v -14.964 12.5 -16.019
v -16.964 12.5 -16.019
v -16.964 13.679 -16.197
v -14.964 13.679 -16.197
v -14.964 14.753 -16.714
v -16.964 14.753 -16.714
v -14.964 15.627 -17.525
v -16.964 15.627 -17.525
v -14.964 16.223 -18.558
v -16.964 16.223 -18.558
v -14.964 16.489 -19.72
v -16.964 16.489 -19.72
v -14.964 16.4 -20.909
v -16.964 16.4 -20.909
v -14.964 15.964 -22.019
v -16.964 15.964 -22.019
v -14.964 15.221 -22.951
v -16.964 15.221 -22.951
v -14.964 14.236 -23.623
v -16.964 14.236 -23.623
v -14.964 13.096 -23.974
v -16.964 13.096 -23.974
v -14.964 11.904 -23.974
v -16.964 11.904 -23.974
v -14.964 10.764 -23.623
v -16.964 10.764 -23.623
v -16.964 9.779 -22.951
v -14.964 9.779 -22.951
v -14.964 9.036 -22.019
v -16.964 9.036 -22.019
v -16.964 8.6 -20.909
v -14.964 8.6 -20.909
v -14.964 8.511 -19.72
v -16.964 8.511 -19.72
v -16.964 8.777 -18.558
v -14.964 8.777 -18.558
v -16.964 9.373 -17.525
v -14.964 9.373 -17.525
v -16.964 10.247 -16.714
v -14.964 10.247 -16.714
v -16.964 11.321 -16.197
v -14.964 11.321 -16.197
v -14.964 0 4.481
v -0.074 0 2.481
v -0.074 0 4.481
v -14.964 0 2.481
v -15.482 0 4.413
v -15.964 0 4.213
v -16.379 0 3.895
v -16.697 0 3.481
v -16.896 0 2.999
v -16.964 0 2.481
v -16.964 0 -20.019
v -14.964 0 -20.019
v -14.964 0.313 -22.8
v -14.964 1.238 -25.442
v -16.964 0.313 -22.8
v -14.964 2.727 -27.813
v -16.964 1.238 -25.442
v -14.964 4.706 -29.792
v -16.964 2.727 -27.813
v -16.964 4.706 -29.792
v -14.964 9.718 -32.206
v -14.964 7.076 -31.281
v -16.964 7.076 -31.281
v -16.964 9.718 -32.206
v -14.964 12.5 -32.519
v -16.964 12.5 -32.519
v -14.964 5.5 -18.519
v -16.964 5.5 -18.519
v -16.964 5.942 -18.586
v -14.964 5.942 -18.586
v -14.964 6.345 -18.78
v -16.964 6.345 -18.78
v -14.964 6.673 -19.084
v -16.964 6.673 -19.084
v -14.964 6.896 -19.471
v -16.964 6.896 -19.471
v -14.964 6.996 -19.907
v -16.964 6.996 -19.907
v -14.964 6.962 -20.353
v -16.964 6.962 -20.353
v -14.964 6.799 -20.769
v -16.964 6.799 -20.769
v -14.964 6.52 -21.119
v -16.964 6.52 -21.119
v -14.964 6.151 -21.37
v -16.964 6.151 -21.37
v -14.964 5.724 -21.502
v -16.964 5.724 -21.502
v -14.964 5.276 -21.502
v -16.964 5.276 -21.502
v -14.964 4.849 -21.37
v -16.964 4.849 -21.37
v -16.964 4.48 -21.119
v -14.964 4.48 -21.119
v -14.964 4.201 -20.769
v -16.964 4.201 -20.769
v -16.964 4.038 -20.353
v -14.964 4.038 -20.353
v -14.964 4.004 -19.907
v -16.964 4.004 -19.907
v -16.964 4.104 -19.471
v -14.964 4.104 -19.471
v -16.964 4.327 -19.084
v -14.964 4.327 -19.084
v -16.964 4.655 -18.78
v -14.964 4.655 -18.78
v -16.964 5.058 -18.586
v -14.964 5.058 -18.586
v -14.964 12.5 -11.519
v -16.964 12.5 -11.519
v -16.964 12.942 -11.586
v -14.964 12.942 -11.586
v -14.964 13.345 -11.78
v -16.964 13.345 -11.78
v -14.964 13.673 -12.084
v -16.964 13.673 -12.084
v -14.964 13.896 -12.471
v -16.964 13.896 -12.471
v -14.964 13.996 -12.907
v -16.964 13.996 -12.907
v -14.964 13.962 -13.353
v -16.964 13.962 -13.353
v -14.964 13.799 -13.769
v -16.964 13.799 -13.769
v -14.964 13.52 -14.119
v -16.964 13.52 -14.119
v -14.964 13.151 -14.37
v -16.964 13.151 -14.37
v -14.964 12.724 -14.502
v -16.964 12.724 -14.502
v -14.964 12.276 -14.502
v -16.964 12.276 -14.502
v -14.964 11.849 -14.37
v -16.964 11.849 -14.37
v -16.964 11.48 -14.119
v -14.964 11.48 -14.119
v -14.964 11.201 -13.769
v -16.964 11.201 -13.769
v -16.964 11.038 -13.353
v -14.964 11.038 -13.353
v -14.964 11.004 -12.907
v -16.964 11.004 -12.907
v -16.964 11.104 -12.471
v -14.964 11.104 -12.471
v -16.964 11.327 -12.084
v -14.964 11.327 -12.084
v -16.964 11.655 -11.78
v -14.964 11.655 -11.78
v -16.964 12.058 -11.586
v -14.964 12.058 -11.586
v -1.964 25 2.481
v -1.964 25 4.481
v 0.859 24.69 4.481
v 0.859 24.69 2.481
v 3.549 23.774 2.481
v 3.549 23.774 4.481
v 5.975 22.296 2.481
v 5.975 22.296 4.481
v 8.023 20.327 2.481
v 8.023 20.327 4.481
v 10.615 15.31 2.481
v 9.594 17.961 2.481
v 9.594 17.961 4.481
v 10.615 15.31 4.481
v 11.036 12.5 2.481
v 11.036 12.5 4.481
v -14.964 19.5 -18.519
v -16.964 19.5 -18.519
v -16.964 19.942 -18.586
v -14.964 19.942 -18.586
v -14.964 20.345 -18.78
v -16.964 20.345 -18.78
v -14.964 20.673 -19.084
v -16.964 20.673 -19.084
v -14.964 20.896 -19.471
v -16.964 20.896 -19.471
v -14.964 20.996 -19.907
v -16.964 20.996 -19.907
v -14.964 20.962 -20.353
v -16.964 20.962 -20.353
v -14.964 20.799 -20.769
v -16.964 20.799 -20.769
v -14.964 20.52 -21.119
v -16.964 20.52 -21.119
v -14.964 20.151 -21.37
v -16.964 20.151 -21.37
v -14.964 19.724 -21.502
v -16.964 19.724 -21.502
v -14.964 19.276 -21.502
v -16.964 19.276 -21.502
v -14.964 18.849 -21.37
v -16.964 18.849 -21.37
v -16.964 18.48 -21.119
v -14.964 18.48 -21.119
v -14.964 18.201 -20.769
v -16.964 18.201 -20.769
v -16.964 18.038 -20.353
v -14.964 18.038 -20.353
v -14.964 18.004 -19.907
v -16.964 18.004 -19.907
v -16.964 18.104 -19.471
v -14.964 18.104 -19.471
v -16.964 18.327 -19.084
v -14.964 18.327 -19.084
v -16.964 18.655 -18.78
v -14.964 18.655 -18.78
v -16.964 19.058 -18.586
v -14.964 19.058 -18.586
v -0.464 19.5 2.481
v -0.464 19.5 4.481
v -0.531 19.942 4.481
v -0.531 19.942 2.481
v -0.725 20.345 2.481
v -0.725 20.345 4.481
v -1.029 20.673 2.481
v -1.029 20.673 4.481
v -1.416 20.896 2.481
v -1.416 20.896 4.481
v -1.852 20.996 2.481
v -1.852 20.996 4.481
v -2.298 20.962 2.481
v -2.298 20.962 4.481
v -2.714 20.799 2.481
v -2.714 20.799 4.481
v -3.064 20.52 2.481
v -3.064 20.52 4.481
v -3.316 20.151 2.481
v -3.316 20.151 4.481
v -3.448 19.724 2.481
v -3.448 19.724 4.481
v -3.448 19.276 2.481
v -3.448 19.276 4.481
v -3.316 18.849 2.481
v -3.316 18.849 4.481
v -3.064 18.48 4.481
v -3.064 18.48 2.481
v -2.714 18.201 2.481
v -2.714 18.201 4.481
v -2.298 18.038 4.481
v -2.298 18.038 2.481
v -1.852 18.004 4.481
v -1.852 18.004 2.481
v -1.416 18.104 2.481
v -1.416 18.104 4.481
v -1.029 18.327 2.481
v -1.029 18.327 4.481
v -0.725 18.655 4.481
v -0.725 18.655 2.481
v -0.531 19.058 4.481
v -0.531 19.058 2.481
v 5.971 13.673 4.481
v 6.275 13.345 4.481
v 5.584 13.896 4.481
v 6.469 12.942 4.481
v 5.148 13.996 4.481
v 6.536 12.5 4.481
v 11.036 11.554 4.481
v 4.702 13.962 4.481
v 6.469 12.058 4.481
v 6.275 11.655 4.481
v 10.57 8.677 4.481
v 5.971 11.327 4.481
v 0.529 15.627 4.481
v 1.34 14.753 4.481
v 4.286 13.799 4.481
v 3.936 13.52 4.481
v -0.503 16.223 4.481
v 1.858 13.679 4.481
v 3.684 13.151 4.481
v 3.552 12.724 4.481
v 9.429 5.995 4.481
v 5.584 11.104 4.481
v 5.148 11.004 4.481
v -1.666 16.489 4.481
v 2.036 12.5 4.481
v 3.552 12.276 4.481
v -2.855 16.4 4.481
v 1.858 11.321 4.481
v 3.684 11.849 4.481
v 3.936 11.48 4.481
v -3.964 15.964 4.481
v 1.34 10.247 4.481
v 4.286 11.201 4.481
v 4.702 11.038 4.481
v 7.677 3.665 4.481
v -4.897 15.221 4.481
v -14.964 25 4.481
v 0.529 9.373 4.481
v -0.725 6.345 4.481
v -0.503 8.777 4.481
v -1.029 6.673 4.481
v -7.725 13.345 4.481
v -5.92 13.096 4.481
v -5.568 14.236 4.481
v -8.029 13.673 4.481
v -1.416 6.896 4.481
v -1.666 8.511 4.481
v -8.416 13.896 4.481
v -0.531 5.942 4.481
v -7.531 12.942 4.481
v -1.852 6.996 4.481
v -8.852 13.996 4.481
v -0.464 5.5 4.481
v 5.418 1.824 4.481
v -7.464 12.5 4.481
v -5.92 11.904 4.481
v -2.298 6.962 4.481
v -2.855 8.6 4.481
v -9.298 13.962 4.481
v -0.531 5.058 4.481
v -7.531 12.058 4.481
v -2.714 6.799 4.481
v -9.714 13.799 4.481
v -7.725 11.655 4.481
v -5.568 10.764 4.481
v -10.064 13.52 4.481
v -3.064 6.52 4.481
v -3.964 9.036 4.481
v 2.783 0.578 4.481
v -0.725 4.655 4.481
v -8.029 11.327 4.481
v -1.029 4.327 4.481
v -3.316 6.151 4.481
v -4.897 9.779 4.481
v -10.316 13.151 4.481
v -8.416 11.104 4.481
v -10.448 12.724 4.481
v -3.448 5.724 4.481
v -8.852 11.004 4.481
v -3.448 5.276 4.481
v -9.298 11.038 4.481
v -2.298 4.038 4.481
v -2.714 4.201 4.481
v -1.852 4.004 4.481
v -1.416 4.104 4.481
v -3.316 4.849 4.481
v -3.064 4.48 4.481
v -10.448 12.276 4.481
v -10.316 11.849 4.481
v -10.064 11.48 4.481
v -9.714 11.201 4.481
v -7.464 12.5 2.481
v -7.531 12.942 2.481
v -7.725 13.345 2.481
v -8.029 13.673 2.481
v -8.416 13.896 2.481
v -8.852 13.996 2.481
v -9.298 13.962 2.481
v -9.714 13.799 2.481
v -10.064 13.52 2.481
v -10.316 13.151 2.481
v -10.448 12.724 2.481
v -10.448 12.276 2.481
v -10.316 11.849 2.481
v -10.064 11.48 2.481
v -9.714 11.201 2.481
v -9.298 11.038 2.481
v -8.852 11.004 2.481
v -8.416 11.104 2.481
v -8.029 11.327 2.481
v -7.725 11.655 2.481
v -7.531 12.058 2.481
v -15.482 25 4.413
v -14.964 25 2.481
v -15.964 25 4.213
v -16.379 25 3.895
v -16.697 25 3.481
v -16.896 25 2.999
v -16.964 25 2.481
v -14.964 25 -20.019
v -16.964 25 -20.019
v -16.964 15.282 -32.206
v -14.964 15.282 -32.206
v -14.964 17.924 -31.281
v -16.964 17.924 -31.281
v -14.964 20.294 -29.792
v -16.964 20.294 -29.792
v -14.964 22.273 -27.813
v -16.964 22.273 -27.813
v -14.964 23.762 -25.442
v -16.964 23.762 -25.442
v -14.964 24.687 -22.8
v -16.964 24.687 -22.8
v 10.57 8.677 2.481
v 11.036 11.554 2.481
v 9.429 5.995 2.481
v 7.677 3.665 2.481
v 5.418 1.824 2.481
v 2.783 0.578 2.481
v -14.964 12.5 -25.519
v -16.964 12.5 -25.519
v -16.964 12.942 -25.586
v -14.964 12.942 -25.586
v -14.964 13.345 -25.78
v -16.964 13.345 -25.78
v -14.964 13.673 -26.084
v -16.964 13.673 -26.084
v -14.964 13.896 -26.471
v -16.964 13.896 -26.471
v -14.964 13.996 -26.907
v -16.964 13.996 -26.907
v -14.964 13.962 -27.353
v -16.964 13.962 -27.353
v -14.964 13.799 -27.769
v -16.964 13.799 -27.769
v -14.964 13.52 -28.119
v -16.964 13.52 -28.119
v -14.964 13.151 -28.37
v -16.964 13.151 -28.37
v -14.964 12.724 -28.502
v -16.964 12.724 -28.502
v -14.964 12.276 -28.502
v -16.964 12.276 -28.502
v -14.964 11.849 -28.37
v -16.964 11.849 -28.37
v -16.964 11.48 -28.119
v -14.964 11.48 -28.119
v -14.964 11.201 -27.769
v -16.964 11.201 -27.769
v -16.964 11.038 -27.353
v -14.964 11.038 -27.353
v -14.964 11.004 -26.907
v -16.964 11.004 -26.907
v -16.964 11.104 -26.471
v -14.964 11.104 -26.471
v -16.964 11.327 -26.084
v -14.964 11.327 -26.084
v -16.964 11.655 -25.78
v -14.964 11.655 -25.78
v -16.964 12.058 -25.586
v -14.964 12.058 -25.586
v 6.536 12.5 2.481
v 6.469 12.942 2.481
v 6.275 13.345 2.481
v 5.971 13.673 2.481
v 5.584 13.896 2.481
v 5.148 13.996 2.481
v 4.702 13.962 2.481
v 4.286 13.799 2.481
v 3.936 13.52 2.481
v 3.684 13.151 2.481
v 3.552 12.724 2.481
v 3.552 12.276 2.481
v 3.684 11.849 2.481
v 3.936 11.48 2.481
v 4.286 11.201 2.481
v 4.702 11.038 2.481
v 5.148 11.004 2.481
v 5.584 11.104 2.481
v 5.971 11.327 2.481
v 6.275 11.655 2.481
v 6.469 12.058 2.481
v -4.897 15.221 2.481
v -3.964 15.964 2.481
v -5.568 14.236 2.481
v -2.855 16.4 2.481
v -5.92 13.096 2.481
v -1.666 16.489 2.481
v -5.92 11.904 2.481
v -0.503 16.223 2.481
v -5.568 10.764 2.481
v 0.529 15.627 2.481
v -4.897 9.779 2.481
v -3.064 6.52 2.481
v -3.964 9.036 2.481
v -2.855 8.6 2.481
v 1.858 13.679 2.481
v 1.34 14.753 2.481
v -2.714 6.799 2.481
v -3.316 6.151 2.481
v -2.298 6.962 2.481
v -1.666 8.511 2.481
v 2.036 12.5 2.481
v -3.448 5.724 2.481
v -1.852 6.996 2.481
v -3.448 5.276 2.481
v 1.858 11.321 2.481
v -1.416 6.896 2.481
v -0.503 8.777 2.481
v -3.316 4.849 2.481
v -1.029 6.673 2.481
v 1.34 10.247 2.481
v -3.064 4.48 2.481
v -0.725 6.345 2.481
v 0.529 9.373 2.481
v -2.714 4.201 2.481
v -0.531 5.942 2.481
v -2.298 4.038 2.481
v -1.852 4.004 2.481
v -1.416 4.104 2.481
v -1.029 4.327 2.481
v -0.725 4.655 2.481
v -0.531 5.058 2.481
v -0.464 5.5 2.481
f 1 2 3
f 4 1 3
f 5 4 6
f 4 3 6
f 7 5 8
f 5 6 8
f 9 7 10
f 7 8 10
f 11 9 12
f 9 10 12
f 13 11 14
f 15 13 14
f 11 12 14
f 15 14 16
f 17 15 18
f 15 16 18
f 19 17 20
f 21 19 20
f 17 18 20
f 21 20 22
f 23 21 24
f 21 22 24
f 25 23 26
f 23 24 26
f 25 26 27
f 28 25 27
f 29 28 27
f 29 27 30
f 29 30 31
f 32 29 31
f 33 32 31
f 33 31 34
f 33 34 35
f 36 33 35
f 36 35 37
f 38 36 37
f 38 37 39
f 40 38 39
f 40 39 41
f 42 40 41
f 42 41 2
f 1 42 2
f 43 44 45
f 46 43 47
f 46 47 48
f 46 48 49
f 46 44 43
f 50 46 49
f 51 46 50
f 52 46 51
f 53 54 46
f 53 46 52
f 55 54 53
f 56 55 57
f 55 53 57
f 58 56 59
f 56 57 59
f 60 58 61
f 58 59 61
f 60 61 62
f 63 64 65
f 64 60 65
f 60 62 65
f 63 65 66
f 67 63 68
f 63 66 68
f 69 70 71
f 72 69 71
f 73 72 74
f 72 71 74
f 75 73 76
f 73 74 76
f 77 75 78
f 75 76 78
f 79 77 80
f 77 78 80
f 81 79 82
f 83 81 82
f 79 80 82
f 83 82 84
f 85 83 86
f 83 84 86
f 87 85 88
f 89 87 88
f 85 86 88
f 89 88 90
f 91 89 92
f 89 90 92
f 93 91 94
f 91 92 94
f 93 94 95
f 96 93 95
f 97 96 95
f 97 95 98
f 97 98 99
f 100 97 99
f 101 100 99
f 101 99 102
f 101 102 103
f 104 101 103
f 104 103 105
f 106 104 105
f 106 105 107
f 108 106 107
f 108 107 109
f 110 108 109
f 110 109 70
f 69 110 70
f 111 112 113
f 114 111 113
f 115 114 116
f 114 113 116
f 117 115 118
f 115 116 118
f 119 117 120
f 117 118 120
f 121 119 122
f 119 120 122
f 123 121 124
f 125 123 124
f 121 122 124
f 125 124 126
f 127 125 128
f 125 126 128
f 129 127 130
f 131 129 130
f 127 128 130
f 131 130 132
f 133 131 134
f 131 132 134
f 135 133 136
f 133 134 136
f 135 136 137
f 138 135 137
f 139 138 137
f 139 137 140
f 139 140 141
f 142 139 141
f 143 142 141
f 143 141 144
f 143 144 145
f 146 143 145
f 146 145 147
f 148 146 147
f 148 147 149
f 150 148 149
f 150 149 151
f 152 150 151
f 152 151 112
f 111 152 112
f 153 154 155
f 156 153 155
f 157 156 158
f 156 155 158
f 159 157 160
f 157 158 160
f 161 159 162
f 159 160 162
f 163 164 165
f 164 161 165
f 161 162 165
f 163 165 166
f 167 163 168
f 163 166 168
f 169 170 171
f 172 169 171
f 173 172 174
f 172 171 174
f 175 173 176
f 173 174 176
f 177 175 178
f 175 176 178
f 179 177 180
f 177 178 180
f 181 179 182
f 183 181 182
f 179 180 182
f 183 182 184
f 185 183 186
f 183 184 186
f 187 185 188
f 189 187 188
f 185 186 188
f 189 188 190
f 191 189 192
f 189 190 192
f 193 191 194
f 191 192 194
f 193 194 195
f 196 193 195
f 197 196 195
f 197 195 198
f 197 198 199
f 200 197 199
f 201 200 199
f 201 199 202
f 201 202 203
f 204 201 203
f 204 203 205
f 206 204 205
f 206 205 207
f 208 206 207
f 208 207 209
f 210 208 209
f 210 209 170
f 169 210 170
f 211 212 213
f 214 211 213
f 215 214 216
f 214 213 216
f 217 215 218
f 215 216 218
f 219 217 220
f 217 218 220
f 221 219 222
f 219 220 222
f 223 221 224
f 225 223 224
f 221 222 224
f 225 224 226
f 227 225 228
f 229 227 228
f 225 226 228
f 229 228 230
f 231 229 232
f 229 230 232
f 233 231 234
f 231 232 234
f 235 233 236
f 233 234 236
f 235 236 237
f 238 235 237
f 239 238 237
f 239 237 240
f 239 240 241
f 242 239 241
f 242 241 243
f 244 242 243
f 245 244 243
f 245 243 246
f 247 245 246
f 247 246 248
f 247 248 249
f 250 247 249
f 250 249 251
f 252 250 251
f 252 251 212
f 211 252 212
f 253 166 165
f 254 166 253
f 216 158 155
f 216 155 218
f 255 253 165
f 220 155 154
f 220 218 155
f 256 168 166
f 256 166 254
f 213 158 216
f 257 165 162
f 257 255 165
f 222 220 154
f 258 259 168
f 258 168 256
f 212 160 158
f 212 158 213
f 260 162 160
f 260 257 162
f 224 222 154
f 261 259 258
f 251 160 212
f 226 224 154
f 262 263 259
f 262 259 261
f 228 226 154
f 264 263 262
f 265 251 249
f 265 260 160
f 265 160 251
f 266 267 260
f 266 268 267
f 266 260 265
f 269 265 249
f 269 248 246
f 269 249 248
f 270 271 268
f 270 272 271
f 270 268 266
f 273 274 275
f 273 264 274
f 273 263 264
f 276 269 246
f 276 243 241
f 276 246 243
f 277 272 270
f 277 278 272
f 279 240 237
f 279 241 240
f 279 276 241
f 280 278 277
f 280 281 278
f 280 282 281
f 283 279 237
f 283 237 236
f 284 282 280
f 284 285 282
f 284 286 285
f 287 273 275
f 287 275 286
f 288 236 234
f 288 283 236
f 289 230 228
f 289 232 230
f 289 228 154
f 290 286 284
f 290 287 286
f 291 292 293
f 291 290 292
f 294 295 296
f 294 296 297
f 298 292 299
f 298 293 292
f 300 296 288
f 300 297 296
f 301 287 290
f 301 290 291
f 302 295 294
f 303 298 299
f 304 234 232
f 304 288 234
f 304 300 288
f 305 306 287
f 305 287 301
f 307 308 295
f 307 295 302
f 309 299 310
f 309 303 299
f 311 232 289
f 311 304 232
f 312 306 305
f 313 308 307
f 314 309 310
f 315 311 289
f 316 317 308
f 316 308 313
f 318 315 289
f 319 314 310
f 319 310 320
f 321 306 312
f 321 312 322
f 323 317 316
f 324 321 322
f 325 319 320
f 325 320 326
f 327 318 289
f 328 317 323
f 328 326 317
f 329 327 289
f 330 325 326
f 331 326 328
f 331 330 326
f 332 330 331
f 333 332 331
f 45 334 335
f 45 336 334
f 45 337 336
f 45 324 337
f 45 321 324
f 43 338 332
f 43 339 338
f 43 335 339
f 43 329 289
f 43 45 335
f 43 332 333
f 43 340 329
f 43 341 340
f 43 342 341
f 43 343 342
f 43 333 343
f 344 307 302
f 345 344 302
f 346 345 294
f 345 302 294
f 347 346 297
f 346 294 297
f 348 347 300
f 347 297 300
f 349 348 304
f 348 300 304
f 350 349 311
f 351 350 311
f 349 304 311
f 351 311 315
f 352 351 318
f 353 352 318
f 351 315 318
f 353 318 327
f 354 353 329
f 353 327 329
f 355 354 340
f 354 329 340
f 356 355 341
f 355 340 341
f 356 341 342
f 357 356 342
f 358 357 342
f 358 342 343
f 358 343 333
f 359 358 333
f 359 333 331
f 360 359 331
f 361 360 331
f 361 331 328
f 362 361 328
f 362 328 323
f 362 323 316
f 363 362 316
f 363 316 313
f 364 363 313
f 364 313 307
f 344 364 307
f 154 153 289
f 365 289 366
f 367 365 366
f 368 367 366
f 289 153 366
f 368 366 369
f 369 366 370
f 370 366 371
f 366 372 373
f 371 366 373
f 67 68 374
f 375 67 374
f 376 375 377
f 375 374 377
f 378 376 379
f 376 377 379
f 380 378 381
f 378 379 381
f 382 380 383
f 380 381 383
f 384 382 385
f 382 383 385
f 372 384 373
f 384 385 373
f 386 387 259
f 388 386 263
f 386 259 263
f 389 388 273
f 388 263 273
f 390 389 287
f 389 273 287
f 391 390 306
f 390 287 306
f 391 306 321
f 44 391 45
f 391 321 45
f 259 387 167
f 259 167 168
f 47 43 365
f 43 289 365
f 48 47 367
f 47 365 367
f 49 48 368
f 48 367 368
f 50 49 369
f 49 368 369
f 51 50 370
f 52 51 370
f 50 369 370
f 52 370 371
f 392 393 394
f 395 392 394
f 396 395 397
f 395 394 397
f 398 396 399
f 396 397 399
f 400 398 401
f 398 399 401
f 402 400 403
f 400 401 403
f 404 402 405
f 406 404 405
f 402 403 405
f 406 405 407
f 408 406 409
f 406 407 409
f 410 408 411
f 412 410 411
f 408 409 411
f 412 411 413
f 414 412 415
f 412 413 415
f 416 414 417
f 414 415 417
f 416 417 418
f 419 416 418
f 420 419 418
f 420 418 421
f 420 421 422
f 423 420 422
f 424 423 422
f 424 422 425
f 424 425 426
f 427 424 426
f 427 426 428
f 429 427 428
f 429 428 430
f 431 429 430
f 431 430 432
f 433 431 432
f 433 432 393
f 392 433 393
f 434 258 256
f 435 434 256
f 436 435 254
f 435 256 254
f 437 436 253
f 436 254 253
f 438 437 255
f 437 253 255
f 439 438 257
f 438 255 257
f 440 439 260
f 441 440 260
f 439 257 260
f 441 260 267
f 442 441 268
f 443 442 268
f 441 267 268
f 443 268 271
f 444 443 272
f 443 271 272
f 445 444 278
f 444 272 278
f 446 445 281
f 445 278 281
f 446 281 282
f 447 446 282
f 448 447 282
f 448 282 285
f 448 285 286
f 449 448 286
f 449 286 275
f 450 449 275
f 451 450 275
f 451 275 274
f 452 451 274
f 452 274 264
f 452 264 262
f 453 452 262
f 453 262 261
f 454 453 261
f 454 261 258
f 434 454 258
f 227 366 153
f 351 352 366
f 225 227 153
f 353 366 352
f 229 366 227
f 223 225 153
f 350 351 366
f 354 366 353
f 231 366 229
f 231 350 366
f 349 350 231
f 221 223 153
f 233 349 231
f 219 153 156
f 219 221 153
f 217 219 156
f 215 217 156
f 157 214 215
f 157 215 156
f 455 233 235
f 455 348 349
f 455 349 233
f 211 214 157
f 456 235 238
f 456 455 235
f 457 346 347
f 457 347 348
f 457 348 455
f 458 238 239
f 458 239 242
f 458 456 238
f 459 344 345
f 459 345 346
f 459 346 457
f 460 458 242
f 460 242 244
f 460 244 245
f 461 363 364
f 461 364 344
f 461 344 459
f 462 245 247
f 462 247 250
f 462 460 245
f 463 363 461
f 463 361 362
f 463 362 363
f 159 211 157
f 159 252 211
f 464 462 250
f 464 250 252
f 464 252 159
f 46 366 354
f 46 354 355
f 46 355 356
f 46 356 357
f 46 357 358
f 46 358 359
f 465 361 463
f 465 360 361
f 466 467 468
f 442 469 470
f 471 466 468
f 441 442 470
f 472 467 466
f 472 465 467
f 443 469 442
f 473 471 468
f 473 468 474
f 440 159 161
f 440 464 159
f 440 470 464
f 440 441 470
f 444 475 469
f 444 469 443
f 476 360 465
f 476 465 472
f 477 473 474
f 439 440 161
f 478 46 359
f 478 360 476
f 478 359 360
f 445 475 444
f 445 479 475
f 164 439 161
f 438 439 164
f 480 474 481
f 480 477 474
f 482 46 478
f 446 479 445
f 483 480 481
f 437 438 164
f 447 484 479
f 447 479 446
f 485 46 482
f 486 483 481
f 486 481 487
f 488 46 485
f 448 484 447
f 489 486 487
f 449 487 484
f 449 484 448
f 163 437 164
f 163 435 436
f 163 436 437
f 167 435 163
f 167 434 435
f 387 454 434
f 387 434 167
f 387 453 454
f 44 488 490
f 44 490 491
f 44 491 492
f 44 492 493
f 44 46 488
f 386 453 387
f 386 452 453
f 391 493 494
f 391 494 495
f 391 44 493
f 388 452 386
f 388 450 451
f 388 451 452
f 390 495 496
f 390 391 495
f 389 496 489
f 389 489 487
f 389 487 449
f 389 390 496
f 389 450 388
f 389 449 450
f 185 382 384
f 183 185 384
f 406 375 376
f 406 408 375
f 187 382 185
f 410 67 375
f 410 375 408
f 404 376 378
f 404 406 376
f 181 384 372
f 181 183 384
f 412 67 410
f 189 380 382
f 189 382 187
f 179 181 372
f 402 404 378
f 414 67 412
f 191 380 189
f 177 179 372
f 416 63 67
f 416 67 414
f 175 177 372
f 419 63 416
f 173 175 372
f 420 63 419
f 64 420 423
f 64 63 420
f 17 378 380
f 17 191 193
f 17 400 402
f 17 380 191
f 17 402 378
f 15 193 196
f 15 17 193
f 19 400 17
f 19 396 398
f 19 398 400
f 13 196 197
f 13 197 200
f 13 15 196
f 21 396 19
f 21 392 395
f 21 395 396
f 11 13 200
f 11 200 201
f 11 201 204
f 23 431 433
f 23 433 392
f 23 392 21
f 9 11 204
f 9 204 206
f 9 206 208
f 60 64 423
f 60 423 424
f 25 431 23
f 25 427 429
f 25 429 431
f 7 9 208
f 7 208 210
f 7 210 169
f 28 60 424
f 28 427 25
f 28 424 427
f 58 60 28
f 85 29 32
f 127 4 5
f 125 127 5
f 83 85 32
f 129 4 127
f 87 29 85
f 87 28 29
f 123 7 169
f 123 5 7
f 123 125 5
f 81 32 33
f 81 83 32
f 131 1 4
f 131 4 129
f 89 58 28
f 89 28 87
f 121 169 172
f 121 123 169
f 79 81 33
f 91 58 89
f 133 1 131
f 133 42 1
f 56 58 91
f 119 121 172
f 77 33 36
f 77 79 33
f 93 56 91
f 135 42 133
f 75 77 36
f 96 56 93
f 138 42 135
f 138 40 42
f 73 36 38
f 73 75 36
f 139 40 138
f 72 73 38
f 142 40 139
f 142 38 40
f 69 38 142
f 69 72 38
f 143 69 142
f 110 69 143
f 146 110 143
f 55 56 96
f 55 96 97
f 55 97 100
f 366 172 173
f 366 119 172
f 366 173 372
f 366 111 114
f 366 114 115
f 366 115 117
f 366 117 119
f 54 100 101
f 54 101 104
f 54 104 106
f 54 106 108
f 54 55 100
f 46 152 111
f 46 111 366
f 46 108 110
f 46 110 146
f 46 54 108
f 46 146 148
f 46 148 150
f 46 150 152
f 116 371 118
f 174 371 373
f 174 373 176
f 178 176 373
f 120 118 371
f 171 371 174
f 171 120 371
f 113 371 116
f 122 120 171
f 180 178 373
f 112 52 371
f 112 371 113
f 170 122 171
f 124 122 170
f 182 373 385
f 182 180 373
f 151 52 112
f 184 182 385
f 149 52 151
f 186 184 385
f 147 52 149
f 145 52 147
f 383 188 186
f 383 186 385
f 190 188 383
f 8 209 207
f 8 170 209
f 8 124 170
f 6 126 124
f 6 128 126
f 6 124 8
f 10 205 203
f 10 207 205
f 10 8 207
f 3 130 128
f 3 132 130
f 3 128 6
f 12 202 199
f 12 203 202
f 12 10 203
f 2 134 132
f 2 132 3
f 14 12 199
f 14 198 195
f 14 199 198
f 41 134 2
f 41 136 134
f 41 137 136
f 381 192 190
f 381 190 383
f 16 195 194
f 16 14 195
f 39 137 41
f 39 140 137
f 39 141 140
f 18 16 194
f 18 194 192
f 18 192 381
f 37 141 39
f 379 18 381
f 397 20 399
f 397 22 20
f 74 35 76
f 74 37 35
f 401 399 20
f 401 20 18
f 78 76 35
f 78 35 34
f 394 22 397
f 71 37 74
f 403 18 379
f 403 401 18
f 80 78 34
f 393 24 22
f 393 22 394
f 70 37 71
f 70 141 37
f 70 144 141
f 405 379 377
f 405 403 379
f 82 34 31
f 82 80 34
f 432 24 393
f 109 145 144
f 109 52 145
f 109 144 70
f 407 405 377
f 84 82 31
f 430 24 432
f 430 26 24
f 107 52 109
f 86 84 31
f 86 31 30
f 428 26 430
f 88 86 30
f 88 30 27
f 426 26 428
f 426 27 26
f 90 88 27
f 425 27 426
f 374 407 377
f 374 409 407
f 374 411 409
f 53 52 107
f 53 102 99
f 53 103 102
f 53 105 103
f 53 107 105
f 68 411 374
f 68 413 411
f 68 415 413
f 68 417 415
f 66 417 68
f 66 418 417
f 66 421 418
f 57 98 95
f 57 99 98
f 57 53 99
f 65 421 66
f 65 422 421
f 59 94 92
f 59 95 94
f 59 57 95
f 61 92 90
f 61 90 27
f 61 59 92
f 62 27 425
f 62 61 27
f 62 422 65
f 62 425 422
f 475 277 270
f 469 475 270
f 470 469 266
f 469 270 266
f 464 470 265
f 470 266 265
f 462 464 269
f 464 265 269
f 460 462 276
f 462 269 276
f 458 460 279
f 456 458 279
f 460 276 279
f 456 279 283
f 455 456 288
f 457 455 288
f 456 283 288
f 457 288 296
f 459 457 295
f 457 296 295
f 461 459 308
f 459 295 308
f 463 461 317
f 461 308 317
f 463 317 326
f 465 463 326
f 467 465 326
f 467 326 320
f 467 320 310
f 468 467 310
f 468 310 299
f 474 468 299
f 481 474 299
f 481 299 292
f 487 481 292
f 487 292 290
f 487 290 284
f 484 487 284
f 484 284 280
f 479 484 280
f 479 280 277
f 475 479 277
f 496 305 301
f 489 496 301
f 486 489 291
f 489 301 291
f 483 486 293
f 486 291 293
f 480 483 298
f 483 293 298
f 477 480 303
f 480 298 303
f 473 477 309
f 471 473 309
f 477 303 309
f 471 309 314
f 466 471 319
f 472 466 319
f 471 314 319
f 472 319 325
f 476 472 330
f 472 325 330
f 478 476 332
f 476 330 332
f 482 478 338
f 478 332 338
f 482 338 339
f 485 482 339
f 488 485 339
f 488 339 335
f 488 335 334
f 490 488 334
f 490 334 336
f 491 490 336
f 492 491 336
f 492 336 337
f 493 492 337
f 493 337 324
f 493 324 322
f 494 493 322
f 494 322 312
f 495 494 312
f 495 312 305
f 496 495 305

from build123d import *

# Parameters (mm, degrees)
ESTRUSIONE_ESTRUSIONE1_DEPTH = 25
RACCORDO1_R                  = 2
TAGLIO_ESTRUSIONE1_DEPTH     = 29
TAGLIO_ESTRUSIONE3_DEPTH     = 38
SCHIZZO6_R                   = 4
SCHIZZO6_R_2                 = 1.5
TAGLIO_ESTRUSIONE4_DEPTH     = 38
SCHIZZO7_R                   = 4
SCHIZZO7_R_2                 = 1.5
TAGLIO_ESTRUSIONE5_DEPTH     = 29


with BuildPart() as part:
    # Schizzo1 → Estrusione-Estrusione1 (new body)
    with BuildSketch(Plane(origin=(0, 0, 0), x_dir=(1, 0, 0), z_dir=(0, 1, 0))):
        Polygon((11.035530567, -4.481060606), (-16.964469433, -4.481060606), (-16.964469433, 32.518939394), (-14.964469433, 32.518939394), (-14.964469433, -2.481060606), (11.035530567, -2.481060606), align=None)
    extrude(amount=ESTRUSIONE_ESTRUSIONE1_DEPTH)

    # Raccordo1
    raccordo1_edges = [part.edges().sort_by_distance(p)[0] for p in [
        (-16.964469433, 12.5, 4.481060606),
    ]]
    fillet(raccordo1_edges, radius=RACCORDO1_R)

    # Schizzo2 → Taglio-Estrusione1 (cut, through all)
    with BuildSketch(Plane.ZY.offset(16.964469433)):
        with BuildLine():
            ThreePointArc((-20.018939394, 0), (-28.857774159, 3.661165235), (-32.518939394, 12.5))
            Line((-32.518939394, 12.5), (-32.518939394, 0))
            Line((-32.518939394, 0), (-20.018939394, 0))
        make_face()
        with BuildLine():
            Line((-20.018939394, 25), (-32.518939394, 25))
            Line((-32.518939394, 25), (-32.518939394, 12.5))
            ThreePointArc((-32.518939394, 12.5), (-28.857774159, 21.338834765), (-20.018939394, 25))
        make_face()
    extrude(amount=-TAGLIO_ESTRUSIONE1_DEPTH, mode=Mode.SUBTRACT)

    # Schizzo4 → Taglio-Estrusione3 (cut, through all)
    with BuildSketch(Plane.XY.offset(4.481060606)):
        with BuildLine():
            Line((11.035530567, 25), (-1.964469433, 25))
            ThreePointArc((-1.964469433, 25), (7.052874966, 21.368038174), (11.035530567, 12.5))
            Line((11.035530567, 12.5), (11.035530567, 25))
        make_face()
        with BuildLine():
            Line((11.035530567, 0), (11.035530567, 11.554155381))
            ThreePointArc((11.035530567, 11.554155381), (7.676890272, 3.665306442), (-0.074234222, 0))
            Line((-0.074234222, 0), (11.035530567, 0))
        make_face()
    extrude(amount=-TAGLIO_ESTRUSIONE3_DEPTH, mode=Mode.SUBTRACT)

    # Schizzo6 → Taglio-Estrusione4 (cut, through all)
    with BuildSketch(Plane.XY.offset(4.481060606)):
        with Locations((-1.964469433, 12.5)):
            Circle(SCHIZZO6_R)
        with Locations((-1.964469433, 19.5)):
            Circle(SCHIZZO6_R_2)
        with Locations((-1.964469433, 5.5)):
            Circle(SCHIZZO6_R_2)
        with Locations((5.035530567, 12.5)):
            Circle(SCHIZZO6_R_2)
        with Locations((-8.964469433, 12.5)):
            Circle(SCHIZZO6_R_2)
    extrude(amount=-TAGLIO_ESTRUSIONE4_DEPTH, mode=Mode.SUBTRACT)

    # Schizzo7 → Taglio-Estrusione5 (cut, through all)
    with BuildSketch(Plane.ZY.offset(16.964469433)):
        with Locations((-20.018939394, 12.5)):
            Circle(SCHIZZO7_R)
        with Locations((-27.018939394, 12.5)):
            Circle(SCHIZZO7_R_2)
        with Locations((-20.018939394, 19.5)):
            Circle(SCHIZZO7_R_2)
        with Locations((-20.018939394, 5.5)):
            Circle(SCHIZZO7_R_2)
        with Locations((-13.018939394, 12.5)):
            Circle(SCHIZZO7_R_2)
    extrude(amount=-TAGLIO_ESTRUSIONE5_DEPTH, mode=Mode.SUBTRACT)


solid = part.part
